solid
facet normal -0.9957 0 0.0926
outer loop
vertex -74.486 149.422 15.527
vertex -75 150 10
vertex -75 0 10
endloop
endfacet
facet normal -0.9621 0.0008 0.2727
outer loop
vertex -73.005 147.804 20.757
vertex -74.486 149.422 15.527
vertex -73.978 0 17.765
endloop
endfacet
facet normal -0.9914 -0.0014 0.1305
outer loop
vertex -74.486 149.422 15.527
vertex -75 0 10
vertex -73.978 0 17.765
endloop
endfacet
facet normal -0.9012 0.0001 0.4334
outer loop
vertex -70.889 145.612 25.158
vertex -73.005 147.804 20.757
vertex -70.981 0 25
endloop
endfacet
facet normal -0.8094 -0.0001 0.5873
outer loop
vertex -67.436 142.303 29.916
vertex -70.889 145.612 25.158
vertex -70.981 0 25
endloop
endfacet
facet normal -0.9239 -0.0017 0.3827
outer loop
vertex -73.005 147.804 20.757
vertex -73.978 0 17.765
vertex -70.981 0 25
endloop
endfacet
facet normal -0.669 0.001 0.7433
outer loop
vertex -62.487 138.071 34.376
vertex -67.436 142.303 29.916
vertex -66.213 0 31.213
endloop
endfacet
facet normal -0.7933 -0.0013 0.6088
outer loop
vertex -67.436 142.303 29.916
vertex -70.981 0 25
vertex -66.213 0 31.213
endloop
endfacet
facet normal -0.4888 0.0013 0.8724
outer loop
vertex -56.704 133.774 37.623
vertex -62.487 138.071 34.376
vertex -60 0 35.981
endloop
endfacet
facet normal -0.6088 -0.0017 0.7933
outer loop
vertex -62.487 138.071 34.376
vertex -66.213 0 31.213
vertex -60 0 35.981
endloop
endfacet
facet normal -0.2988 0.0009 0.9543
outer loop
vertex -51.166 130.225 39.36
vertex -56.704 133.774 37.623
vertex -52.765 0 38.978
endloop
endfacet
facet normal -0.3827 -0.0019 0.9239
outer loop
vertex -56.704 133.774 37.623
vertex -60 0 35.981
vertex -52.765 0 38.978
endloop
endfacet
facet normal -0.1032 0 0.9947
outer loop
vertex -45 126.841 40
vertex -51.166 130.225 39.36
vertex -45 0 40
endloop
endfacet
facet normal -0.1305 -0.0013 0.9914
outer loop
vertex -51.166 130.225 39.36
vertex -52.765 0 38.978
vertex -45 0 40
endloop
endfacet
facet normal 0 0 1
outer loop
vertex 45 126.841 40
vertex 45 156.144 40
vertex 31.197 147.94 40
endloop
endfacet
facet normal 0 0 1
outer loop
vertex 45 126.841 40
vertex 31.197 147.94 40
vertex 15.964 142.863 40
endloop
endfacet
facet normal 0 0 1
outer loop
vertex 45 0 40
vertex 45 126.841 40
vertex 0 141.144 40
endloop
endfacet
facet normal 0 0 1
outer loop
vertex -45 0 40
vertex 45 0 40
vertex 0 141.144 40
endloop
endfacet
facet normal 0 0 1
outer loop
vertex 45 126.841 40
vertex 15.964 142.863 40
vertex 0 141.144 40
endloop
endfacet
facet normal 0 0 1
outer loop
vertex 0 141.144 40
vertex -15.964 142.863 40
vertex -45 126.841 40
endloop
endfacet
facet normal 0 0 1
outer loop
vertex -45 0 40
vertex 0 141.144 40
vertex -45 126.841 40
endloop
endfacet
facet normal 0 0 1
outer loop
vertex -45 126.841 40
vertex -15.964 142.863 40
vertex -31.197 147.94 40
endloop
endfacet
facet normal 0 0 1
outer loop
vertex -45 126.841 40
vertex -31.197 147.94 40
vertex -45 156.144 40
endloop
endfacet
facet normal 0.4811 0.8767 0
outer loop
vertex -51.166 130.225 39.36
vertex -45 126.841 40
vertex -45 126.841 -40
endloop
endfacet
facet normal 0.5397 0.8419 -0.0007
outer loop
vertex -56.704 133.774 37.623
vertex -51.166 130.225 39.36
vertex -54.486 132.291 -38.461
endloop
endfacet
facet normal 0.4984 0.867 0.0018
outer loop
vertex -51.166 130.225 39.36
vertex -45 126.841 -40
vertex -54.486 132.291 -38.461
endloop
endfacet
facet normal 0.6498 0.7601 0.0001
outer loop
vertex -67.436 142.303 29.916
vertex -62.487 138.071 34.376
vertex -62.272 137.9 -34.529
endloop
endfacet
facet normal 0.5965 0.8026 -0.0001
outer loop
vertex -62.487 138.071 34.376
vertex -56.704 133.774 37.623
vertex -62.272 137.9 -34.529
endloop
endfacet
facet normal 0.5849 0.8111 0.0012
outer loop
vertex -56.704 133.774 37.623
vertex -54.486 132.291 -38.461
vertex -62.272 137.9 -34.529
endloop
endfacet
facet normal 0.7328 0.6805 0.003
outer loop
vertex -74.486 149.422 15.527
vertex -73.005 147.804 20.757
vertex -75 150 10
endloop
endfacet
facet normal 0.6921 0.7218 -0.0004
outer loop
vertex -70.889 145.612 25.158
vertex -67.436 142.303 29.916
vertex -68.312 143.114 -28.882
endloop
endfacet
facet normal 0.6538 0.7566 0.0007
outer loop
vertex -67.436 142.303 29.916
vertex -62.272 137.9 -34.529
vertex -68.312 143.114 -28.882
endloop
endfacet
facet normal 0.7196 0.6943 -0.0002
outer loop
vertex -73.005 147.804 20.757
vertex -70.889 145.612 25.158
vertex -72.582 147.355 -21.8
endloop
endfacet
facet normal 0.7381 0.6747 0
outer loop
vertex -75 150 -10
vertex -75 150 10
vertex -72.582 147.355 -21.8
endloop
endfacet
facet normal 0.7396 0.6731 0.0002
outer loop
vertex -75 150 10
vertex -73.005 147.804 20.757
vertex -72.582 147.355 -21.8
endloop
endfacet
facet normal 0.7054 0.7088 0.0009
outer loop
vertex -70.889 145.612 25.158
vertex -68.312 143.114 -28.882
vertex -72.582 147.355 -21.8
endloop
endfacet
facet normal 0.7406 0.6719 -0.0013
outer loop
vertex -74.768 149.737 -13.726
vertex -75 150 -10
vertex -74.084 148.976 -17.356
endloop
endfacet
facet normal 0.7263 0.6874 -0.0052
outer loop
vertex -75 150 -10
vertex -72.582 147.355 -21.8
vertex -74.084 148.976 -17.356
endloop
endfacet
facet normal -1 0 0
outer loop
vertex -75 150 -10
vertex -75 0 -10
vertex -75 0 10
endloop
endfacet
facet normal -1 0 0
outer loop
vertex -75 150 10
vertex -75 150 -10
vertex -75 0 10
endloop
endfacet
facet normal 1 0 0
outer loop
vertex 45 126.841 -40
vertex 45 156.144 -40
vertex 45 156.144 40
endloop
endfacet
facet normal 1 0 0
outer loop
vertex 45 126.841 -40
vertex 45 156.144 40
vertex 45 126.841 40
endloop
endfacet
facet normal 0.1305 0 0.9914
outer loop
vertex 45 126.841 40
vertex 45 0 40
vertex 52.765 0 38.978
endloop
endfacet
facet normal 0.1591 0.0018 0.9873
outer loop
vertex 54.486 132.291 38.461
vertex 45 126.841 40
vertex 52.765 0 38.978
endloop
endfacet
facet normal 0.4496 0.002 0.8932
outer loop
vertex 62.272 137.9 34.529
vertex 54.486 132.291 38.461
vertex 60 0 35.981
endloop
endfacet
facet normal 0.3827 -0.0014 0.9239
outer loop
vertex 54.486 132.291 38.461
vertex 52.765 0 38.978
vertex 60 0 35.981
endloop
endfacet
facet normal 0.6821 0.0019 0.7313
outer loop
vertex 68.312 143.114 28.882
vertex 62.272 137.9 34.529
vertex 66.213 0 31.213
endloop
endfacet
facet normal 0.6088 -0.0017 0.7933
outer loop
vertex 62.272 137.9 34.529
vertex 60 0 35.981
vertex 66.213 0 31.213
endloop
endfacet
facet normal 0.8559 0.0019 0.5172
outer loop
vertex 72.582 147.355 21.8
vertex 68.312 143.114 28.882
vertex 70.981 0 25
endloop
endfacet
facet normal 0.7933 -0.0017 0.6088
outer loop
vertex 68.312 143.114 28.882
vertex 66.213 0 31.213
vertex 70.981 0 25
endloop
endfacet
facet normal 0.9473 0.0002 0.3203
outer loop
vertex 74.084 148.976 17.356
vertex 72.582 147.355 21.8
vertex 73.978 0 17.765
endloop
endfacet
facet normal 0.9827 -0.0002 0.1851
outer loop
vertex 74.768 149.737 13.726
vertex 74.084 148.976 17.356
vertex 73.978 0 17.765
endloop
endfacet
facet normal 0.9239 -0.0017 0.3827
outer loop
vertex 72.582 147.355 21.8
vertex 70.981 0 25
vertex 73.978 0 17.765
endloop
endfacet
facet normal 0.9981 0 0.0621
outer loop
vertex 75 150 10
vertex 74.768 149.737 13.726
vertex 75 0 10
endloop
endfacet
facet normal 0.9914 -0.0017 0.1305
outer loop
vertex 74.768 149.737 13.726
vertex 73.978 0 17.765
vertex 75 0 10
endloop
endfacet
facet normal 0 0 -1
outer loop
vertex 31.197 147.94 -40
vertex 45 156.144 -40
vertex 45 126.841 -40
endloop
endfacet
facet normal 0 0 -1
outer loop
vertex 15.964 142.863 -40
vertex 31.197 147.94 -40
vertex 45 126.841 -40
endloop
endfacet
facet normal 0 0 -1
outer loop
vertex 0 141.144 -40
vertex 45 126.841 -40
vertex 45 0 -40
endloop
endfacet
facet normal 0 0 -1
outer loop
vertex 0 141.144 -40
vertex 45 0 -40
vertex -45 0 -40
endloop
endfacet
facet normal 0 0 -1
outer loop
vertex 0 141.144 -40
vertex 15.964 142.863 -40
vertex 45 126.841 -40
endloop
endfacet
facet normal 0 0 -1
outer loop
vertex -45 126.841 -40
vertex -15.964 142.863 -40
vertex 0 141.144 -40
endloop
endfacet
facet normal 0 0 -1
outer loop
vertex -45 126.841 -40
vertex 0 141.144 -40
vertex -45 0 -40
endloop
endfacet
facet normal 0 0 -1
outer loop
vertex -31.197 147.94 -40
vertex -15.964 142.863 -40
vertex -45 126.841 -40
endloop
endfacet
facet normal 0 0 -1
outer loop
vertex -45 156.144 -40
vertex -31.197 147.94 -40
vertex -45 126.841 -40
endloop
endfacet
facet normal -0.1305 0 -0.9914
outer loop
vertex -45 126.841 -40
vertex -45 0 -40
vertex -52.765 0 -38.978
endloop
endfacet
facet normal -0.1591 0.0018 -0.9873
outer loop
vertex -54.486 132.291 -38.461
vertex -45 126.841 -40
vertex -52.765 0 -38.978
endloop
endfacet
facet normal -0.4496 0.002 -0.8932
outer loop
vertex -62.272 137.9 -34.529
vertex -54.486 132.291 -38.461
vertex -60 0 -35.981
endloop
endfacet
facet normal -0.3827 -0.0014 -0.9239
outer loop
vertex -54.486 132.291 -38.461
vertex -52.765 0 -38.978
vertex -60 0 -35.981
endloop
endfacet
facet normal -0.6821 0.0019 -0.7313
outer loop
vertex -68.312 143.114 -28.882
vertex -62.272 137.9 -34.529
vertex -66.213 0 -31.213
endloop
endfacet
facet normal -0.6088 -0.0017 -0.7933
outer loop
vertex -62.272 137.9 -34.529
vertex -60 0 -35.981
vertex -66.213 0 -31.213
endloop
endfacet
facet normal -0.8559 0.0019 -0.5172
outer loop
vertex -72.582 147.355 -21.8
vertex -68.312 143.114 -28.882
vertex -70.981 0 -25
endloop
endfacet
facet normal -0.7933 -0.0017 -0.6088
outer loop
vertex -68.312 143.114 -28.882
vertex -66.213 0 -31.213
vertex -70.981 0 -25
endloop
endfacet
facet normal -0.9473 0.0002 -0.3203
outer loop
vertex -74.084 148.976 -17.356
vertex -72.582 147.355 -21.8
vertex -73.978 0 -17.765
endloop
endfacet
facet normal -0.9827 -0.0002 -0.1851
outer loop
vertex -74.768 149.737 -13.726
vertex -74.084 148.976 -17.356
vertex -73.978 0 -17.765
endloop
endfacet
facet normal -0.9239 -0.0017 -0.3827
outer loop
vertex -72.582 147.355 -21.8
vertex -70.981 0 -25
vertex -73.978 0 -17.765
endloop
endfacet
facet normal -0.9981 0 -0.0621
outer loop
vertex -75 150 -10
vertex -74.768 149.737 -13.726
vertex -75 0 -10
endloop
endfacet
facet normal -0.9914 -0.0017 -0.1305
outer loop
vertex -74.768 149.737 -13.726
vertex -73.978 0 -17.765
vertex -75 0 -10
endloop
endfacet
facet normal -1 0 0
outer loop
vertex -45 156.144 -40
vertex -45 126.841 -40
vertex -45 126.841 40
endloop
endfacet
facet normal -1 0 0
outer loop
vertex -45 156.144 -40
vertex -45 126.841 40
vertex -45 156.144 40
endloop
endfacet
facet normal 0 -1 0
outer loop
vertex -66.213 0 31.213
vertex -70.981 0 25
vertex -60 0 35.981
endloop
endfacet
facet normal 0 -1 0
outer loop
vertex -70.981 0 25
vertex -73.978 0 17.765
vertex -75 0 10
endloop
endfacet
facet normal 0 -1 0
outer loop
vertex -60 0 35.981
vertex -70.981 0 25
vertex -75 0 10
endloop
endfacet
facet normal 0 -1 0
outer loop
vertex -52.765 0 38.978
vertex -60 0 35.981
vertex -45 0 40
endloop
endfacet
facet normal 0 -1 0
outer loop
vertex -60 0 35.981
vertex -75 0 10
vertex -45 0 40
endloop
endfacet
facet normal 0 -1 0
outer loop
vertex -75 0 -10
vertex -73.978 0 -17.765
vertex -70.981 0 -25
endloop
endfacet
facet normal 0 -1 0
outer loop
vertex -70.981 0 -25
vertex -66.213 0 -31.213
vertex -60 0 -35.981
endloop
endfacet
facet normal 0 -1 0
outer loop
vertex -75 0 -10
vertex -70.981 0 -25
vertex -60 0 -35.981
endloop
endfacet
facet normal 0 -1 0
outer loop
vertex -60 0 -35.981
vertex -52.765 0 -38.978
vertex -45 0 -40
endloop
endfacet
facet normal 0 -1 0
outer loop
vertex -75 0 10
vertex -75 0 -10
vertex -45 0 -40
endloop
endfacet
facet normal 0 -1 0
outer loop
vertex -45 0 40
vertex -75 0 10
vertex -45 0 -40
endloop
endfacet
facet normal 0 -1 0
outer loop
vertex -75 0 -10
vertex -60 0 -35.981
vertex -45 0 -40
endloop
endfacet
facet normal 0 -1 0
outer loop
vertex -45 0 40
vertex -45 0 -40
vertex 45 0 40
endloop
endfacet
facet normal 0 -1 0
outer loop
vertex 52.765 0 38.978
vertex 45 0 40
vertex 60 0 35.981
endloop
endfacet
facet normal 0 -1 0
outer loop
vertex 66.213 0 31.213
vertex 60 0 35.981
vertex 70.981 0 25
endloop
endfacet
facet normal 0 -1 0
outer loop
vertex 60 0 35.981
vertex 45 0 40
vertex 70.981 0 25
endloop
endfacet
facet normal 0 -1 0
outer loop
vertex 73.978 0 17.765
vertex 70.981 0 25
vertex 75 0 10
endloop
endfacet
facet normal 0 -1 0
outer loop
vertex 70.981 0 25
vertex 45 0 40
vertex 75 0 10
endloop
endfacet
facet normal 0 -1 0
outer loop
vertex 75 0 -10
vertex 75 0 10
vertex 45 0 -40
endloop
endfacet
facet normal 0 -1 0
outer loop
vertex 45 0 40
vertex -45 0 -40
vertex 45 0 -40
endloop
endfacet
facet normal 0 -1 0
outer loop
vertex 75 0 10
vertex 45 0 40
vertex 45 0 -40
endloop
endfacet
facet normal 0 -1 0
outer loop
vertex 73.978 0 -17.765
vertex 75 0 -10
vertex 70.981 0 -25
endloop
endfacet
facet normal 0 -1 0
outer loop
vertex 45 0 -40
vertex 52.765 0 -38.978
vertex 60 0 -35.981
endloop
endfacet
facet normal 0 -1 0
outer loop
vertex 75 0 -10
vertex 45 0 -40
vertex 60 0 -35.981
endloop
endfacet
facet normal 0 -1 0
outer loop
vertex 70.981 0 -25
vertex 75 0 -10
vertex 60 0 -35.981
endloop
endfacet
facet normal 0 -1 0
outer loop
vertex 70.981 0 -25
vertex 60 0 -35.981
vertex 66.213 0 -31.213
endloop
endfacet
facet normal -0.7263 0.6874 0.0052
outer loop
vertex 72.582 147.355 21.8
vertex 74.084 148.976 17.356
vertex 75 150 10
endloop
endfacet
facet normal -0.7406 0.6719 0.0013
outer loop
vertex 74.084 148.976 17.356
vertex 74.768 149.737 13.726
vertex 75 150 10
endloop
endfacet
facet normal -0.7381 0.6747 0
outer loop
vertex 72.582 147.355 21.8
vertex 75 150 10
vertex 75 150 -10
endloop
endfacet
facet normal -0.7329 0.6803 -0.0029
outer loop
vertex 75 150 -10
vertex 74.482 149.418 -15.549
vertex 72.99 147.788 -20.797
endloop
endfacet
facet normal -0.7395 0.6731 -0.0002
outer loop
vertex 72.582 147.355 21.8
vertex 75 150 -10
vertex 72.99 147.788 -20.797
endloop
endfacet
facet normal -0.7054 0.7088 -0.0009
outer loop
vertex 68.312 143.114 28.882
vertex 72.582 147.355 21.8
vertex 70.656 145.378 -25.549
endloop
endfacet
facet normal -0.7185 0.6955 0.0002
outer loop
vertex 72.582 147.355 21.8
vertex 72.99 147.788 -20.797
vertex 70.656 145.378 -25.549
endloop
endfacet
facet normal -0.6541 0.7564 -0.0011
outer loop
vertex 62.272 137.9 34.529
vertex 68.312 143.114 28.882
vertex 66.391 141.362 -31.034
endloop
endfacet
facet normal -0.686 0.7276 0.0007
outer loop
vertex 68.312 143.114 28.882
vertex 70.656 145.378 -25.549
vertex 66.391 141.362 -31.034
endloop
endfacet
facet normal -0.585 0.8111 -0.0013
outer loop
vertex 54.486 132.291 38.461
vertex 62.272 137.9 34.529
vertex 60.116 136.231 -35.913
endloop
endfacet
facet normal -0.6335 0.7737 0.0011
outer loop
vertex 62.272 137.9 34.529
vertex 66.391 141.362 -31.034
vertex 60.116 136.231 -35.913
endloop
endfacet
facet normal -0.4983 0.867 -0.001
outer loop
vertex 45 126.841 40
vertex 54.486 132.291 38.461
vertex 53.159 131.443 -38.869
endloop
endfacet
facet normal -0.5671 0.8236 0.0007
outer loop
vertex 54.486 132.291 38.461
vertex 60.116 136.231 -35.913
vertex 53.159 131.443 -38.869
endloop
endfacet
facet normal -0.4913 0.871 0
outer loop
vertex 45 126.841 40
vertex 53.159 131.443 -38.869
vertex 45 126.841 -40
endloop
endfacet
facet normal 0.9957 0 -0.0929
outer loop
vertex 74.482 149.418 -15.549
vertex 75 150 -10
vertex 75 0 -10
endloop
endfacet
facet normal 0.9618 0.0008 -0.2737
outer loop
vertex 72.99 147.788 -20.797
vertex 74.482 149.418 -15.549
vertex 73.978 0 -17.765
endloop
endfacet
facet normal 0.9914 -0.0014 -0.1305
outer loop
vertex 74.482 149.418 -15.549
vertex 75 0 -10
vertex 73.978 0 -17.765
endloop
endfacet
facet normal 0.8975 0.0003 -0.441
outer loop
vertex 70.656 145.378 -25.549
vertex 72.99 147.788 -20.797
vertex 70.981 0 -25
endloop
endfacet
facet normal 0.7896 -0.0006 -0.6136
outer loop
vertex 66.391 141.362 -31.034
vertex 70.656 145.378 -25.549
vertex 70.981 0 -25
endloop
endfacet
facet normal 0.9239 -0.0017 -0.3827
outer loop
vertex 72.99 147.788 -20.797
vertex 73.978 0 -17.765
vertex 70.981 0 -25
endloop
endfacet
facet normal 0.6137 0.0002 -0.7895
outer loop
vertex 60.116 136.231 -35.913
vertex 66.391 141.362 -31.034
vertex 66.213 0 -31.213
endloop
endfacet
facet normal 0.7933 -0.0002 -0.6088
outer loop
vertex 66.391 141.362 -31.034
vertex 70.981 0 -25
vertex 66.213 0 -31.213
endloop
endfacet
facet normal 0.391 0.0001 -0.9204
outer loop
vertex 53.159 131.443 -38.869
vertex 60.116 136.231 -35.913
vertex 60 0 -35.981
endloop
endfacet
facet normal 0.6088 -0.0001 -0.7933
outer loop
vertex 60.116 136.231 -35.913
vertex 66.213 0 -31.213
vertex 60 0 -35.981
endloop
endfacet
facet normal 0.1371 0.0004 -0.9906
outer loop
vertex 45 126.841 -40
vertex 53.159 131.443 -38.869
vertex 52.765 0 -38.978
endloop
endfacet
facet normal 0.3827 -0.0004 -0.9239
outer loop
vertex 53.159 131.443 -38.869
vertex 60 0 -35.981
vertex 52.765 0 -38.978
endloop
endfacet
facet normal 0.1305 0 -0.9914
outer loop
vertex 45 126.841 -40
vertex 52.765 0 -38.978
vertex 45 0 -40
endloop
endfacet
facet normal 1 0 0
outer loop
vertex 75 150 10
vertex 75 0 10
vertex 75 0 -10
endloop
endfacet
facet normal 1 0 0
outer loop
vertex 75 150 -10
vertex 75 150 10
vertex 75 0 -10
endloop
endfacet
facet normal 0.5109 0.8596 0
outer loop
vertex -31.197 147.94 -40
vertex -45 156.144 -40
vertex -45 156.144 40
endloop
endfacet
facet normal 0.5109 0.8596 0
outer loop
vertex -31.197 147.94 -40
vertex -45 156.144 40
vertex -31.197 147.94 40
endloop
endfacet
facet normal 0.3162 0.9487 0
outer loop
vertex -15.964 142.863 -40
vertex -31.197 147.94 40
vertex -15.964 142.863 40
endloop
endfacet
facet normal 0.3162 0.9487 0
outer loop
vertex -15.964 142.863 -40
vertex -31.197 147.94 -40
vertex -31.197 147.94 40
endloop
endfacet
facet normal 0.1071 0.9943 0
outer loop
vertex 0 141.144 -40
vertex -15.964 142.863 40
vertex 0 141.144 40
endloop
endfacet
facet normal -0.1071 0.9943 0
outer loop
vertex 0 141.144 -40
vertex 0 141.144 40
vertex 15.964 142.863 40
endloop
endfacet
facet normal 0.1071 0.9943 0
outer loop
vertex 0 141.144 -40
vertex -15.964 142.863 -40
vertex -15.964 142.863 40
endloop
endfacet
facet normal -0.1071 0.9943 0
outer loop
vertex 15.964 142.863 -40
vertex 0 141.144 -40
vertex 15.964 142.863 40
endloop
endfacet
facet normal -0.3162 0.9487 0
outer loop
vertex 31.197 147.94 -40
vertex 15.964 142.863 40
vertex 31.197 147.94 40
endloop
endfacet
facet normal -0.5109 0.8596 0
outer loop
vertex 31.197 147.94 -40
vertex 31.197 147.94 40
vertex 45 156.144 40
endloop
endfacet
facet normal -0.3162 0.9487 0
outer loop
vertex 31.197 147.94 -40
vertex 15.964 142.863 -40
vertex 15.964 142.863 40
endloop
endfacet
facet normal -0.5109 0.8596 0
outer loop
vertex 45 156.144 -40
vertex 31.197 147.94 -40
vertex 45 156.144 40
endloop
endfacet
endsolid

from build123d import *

# Parameters (mm, degrees)
BOSS_EXTRUDE1_DEPTH     = 150
CUT_EXTRUDE1_DEPTH      = 173.409396496
CUT_EXTRUDE1_DEPTH_BACK = 173.409396496
SKETCH3_OUTSIDE_W       = 197.344
SKETCH3_OUTSIDE_H       = 197.344
BOSS_EXTRUDE2_START     = -80
BOSS_EXTRUDE2_DEPTH     = 80


with BuildPart() as part:
    # Sketch1 → Boss-Extrude1 (new body)
    with BuildSketch(Plane(origin=(0, 0, 0), x_dir=(1, 0, 0), z_dir=(0, 1, 0))):
        with BuildLine():
            Line((-45, -40), (45, -40))
            ThreePointArc((45, -40), (66.213203436, -31.213203436), (75, -10))
            Line((75, -10), (75, 10))
            ThreePointArc((75, 10), (66.213203436, 31.213203436), (45, 40))
            Line((45, 40), (-45, 40))
            ThreePointArc((-45, 40), (-66.213203436, 31.213203436), (-75, 10))
            Line((-75, 10), (-75, -10))
            ThreePointArc((-75, -10), (-66.213203436, -31.213203436), (-45, -40))
        make_face()
    extrude(amount=BOSS_EXTRUDE1_DEPTH)

    # Sketch3 outside → Cut-Extrude1 (cut, two sides: drawn at the far end of the back side and taken through both)
    with BuildSketch(Plane.XY.offset(-CUT_EXTRUDE1_DEPTH_BACK)):
        with Locations((0, 75)):
            Rectangle(SKETCH3_OUTSIDE_W, SKETCH3_OUTSIDE_H)
        with BuildLine():
            Line((-75, 150), (-75, 0))
            Line((-75, 0), (75, 0))
            Line((75, 0), (75, 150))
            ThreePointArc((75, 150), (0, 116.143782777), (-75, 150))
        make_face(mode=Mode.SUBTRACT)
    extrude(amount=CUT_EXTRUDE1_DEPTH + CUT_EXTRUDE1_DEPTH_BACK, mode=Mode.SUBTRACT)

    # Sketch6 → Boss-Extrude2 (add)
    with BuildSketch(Plane.XY.offset(40).offset(BOSS_EXTRUDE2_START)):
        with BuildLine():
            Line((-45, 126.840927279), (-45, 156.143782777))
            ThreePointArc((-45, 156.143782777), (0, 141.143782777), (45, 156.143782777))
            Line((45, 156.143782777), (45, 126.840927279))
            ThreePointArc((45, 126.840927279), (0, 116.143782777), (-45, 126.840927279))
        make_face()
    extrude(amount=BOSS_EXTRUDE2_DEPTH)


solid = part.part
